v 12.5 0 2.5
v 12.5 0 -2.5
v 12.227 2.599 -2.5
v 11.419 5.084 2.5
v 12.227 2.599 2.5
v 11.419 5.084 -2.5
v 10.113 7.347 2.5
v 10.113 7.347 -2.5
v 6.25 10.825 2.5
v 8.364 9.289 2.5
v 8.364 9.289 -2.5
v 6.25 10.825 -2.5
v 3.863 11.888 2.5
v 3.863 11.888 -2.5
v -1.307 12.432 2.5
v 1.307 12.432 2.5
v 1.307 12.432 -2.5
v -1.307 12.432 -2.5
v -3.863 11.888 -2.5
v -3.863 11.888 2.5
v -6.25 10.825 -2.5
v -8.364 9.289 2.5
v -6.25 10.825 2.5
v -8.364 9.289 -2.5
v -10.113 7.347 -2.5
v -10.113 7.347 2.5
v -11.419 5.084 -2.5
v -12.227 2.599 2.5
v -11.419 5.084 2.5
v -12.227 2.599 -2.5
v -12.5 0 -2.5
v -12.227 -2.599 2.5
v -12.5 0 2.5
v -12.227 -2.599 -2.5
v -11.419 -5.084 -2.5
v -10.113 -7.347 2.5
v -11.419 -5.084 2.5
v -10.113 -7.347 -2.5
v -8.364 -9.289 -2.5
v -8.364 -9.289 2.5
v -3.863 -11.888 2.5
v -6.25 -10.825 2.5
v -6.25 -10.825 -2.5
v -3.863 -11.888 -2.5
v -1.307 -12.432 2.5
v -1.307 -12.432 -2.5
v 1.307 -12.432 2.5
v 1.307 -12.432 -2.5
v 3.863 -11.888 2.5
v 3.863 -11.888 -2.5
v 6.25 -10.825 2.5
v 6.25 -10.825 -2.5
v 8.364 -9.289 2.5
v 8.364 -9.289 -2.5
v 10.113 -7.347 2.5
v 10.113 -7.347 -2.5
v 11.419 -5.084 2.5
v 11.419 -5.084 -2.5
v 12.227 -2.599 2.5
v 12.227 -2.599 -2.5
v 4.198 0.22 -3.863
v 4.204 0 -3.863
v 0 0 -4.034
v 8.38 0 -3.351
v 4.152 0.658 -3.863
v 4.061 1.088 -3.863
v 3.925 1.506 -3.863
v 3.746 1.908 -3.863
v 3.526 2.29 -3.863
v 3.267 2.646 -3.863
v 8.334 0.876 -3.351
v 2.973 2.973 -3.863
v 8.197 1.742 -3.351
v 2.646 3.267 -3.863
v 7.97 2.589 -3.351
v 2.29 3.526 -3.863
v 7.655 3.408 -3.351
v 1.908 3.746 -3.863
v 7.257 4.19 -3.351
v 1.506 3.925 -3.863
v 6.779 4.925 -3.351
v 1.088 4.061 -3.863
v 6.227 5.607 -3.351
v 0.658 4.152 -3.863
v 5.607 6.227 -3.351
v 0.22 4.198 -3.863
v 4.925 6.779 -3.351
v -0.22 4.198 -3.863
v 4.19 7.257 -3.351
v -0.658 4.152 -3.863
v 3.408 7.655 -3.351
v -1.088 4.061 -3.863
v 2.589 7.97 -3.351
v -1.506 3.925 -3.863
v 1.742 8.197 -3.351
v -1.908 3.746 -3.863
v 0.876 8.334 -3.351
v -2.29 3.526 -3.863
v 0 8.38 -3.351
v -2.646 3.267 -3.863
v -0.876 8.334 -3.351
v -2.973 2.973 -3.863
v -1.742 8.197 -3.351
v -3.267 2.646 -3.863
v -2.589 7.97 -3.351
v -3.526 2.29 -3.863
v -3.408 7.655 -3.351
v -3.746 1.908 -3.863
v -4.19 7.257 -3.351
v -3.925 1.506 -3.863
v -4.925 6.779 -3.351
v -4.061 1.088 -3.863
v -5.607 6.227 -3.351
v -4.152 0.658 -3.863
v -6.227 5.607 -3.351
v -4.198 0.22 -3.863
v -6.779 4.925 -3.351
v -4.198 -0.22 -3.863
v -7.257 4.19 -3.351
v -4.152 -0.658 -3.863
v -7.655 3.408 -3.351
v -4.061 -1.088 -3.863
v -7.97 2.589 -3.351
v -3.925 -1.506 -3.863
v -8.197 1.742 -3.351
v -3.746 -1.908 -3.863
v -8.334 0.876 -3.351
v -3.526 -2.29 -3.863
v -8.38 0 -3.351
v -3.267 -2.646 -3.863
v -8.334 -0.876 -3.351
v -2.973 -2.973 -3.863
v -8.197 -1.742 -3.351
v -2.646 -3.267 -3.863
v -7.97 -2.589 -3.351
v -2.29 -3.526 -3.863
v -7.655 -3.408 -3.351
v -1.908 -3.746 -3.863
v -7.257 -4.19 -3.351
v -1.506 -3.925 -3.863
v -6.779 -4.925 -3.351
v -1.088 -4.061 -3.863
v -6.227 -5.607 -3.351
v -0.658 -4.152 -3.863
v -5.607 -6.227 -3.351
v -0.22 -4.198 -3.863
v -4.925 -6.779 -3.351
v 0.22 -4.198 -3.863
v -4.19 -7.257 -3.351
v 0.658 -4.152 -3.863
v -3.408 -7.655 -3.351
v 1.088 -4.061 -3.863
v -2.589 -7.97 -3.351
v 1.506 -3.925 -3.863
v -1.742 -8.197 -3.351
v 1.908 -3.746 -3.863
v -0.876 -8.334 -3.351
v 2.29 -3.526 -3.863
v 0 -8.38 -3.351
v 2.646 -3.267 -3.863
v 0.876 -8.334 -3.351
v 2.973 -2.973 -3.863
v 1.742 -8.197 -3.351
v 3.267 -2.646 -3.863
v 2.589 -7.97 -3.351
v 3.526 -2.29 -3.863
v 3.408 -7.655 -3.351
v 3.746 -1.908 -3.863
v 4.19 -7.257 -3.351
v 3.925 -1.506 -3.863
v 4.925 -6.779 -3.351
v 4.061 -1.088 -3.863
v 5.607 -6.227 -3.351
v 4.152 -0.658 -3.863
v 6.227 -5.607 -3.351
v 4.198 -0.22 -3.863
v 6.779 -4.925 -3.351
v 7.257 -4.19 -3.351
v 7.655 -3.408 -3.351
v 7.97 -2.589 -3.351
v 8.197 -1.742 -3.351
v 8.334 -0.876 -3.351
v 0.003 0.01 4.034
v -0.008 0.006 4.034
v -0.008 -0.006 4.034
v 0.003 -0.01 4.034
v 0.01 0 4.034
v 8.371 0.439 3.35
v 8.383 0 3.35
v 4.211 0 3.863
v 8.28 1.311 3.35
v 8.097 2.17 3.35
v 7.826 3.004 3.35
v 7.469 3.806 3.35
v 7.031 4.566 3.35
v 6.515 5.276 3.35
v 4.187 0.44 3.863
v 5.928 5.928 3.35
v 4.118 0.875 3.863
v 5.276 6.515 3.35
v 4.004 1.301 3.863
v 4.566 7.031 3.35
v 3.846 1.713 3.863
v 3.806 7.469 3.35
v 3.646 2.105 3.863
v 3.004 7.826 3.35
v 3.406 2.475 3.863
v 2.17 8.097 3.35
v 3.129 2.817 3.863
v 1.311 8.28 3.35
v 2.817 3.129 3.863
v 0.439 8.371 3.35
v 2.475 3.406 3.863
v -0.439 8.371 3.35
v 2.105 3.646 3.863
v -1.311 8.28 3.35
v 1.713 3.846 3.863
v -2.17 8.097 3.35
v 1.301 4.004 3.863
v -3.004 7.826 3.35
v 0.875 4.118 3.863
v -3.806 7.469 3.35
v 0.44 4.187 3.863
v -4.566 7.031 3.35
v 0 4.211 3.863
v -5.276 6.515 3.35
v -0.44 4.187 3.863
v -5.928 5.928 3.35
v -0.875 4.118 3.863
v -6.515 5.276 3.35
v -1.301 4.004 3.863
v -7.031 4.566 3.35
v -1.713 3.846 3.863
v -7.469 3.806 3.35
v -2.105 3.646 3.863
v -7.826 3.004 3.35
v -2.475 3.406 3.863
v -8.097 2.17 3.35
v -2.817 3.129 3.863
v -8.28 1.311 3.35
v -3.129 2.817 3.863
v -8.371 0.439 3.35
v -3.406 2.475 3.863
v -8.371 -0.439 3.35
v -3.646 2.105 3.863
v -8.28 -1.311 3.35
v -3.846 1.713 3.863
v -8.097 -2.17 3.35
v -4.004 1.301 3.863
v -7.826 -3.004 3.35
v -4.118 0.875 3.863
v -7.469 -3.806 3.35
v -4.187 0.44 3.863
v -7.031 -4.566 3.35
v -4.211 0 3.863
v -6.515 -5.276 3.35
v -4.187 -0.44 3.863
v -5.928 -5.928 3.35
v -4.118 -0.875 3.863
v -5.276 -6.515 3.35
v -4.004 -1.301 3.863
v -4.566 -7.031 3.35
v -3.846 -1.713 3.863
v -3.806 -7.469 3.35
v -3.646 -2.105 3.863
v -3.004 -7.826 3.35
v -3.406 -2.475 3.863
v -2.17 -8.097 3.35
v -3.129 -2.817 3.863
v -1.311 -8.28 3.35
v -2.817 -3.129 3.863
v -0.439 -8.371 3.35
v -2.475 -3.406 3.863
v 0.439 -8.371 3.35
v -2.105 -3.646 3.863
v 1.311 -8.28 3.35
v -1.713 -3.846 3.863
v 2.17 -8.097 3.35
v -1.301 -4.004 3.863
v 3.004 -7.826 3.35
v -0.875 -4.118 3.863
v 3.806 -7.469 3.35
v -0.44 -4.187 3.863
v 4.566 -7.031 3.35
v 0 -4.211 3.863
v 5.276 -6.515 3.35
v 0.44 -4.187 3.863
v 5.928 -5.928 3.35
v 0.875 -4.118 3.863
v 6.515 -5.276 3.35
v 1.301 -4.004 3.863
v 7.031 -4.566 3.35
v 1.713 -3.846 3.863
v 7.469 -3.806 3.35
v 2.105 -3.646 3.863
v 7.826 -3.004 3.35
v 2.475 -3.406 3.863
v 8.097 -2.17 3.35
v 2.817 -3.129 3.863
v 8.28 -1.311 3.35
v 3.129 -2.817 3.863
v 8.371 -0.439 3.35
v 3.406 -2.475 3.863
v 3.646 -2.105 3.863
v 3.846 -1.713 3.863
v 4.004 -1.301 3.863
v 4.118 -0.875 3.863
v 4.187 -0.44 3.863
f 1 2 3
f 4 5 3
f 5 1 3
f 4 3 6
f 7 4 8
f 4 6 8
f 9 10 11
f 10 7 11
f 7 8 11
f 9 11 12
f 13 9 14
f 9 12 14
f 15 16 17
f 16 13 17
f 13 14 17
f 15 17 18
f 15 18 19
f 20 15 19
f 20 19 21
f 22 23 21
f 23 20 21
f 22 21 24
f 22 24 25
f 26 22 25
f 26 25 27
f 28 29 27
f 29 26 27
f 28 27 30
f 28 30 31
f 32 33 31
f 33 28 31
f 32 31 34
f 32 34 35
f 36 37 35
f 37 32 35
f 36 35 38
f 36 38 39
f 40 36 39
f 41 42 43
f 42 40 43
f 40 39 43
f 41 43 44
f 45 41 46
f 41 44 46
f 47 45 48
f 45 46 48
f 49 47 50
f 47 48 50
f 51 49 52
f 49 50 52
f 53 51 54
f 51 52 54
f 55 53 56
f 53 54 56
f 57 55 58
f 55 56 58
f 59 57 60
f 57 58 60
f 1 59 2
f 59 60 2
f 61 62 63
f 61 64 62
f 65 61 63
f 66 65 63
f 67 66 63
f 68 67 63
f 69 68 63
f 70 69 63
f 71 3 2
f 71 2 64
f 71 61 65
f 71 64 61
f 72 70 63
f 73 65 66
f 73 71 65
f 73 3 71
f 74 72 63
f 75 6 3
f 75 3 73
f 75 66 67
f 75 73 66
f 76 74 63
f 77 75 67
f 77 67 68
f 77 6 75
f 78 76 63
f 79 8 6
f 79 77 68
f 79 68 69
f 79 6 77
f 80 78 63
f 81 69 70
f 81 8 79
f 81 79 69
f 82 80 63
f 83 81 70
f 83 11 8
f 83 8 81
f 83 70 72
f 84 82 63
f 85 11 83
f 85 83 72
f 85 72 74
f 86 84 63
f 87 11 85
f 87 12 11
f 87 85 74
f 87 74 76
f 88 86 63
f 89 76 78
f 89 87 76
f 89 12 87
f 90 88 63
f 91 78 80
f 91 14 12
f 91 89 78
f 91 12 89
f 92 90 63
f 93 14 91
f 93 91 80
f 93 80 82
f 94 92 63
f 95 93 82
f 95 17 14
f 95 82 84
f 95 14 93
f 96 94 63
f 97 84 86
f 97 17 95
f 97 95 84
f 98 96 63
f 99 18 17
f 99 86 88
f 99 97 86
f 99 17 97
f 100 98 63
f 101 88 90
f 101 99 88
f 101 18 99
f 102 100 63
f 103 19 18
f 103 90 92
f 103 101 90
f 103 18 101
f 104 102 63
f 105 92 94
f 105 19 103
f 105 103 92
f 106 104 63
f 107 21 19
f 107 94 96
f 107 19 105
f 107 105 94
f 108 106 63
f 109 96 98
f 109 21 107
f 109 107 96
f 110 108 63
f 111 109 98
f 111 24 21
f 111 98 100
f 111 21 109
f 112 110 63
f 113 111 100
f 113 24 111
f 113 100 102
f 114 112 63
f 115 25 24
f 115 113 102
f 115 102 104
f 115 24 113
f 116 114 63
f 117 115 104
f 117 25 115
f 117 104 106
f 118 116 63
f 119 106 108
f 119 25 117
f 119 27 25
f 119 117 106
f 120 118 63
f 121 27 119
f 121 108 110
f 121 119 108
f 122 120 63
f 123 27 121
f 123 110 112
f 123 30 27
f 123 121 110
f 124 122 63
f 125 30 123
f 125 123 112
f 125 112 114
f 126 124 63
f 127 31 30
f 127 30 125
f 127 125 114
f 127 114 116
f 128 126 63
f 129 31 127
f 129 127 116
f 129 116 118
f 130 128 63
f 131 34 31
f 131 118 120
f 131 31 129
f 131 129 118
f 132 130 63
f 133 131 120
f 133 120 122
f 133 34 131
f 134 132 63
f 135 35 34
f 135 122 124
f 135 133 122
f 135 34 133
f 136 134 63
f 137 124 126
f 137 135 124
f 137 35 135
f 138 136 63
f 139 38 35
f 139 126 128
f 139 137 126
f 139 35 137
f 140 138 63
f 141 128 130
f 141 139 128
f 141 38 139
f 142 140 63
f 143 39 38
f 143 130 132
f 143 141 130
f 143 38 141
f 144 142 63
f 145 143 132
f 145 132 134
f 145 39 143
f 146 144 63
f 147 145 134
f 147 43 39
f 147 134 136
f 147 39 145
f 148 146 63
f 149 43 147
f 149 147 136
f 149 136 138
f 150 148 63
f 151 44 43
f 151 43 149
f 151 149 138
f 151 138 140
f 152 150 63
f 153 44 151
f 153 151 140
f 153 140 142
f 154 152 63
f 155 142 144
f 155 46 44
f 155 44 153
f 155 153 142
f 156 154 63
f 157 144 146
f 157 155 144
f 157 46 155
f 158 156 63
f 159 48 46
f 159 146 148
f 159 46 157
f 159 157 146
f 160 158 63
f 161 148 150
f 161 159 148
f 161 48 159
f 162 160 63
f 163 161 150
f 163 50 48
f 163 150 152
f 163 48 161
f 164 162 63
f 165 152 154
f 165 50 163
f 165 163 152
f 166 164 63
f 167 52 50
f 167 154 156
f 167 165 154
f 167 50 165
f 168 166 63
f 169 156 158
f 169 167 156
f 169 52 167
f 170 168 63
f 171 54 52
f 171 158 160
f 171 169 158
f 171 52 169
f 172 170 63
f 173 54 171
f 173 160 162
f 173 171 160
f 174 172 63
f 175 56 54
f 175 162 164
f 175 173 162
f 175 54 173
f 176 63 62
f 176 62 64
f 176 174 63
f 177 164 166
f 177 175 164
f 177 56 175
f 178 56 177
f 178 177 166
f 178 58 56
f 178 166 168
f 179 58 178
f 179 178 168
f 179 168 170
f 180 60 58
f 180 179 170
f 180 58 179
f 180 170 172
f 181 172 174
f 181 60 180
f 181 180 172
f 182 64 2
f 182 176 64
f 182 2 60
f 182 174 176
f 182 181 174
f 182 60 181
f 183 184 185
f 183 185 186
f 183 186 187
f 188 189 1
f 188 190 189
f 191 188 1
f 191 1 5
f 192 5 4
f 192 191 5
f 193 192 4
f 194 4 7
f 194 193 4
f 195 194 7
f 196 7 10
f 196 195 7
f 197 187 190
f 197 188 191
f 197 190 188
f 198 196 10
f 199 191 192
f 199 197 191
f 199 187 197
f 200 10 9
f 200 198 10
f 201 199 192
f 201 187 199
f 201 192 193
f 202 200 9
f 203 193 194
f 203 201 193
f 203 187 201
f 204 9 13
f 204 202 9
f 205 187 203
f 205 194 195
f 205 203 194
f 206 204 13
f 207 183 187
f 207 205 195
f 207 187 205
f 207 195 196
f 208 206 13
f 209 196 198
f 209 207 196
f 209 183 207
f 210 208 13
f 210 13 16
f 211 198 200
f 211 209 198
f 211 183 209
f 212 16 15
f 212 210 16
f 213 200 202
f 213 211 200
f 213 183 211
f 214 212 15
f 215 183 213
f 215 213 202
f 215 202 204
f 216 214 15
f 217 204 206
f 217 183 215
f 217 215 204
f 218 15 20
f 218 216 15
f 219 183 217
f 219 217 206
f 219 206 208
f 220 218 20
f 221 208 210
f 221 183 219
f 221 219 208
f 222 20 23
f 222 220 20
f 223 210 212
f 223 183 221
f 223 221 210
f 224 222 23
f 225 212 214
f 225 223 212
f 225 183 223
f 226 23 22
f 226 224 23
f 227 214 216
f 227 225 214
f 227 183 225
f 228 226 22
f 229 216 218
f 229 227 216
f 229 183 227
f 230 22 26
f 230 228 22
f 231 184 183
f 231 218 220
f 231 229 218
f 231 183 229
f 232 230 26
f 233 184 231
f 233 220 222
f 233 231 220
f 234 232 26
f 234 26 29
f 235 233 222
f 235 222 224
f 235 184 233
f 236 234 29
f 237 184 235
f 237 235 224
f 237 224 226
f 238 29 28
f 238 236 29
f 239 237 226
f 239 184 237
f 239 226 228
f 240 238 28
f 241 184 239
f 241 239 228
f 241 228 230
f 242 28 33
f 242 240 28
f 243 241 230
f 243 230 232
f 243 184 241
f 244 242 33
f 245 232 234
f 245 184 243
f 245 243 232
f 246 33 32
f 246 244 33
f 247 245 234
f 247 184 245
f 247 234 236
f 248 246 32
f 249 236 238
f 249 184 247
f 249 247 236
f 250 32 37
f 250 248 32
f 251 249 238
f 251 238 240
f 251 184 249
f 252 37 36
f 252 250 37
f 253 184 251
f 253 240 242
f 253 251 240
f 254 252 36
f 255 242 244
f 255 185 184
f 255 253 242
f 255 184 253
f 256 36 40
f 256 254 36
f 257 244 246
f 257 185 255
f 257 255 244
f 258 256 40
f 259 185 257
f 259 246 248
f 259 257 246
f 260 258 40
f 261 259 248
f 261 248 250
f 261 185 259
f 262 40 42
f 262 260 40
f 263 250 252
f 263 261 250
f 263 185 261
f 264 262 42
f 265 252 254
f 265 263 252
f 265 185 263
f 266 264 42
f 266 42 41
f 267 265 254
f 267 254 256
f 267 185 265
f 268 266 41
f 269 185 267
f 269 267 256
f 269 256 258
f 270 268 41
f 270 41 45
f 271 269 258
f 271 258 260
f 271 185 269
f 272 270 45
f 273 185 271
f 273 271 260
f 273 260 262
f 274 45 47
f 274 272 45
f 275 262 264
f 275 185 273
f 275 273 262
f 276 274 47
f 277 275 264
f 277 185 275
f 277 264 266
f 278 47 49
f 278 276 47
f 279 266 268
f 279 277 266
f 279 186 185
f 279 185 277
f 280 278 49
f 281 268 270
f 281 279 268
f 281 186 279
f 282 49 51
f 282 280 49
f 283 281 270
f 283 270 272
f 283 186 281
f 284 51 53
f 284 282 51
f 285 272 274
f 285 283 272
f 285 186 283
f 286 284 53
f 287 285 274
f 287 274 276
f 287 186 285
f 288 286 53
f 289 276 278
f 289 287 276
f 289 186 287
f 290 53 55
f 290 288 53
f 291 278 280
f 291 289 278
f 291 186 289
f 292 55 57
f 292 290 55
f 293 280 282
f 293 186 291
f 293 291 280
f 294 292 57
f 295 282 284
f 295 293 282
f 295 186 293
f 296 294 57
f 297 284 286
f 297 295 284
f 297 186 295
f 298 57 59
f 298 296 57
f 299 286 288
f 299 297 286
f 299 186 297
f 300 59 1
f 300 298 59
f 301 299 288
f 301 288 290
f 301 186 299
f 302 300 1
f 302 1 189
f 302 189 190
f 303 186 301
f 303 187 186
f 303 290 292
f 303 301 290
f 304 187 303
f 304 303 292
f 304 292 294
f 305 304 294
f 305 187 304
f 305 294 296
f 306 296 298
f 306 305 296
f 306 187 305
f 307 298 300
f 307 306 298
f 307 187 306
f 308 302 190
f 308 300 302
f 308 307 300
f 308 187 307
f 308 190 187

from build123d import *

# Parameters (mm, degrees)
CYLINDER_R     = 12.5
CYLINDER_DEPTH = 8.068975


with BuildPart() as sphere001:
    # Sphere001 → Sphere001 (revolve)
    with BuildSketch(Plane(origin=(0, 0, -47.645512), x_dir=(1, 0, 0), z_dir=(0, -1, 0))):
        with BuildLine():
            ThreePointArc((0, -51.68), (51.68, 0), (0, 51.68))
            Line((0, 51.68), (0, -51.68))
        make_face()
    revolve(axis=Axis((0, 0, -47.645512), (0, 0, 1)))


with BuildPart() as common:
    # Sphere → Sphere (revolve)
    with BuildSketch(Plane(origin=(0, 0, 47.645512), x_dir=(1, 0, 0), z_dir=(0, -1, 0))):
        with BuildLine():
            ThreePointArc((0, -51.68), (51.68, 0), (0, 51.68))
            Line((0, 51.68), (0, -51.68))
        make_face()
    revolve(axis=Axis((0, 0, 47.645512), (0, 0, 1)))

    # Common: intersect Sphere001
    add(sphere001.part, mode=Mode.INTERSECT)


with BuildPart() as lens:
    # Cylinder → Cylinder (new body)
    with BuildSketch(Plane.XY.offset(-4.034488)):
        Circle(CYLINDER_R)
    extrude(amount=CYLINDER_DEPTH)

    # Common001: intersect Common
    add(common.part, mode=Mode.INTERSECT)


solid = lens.part
